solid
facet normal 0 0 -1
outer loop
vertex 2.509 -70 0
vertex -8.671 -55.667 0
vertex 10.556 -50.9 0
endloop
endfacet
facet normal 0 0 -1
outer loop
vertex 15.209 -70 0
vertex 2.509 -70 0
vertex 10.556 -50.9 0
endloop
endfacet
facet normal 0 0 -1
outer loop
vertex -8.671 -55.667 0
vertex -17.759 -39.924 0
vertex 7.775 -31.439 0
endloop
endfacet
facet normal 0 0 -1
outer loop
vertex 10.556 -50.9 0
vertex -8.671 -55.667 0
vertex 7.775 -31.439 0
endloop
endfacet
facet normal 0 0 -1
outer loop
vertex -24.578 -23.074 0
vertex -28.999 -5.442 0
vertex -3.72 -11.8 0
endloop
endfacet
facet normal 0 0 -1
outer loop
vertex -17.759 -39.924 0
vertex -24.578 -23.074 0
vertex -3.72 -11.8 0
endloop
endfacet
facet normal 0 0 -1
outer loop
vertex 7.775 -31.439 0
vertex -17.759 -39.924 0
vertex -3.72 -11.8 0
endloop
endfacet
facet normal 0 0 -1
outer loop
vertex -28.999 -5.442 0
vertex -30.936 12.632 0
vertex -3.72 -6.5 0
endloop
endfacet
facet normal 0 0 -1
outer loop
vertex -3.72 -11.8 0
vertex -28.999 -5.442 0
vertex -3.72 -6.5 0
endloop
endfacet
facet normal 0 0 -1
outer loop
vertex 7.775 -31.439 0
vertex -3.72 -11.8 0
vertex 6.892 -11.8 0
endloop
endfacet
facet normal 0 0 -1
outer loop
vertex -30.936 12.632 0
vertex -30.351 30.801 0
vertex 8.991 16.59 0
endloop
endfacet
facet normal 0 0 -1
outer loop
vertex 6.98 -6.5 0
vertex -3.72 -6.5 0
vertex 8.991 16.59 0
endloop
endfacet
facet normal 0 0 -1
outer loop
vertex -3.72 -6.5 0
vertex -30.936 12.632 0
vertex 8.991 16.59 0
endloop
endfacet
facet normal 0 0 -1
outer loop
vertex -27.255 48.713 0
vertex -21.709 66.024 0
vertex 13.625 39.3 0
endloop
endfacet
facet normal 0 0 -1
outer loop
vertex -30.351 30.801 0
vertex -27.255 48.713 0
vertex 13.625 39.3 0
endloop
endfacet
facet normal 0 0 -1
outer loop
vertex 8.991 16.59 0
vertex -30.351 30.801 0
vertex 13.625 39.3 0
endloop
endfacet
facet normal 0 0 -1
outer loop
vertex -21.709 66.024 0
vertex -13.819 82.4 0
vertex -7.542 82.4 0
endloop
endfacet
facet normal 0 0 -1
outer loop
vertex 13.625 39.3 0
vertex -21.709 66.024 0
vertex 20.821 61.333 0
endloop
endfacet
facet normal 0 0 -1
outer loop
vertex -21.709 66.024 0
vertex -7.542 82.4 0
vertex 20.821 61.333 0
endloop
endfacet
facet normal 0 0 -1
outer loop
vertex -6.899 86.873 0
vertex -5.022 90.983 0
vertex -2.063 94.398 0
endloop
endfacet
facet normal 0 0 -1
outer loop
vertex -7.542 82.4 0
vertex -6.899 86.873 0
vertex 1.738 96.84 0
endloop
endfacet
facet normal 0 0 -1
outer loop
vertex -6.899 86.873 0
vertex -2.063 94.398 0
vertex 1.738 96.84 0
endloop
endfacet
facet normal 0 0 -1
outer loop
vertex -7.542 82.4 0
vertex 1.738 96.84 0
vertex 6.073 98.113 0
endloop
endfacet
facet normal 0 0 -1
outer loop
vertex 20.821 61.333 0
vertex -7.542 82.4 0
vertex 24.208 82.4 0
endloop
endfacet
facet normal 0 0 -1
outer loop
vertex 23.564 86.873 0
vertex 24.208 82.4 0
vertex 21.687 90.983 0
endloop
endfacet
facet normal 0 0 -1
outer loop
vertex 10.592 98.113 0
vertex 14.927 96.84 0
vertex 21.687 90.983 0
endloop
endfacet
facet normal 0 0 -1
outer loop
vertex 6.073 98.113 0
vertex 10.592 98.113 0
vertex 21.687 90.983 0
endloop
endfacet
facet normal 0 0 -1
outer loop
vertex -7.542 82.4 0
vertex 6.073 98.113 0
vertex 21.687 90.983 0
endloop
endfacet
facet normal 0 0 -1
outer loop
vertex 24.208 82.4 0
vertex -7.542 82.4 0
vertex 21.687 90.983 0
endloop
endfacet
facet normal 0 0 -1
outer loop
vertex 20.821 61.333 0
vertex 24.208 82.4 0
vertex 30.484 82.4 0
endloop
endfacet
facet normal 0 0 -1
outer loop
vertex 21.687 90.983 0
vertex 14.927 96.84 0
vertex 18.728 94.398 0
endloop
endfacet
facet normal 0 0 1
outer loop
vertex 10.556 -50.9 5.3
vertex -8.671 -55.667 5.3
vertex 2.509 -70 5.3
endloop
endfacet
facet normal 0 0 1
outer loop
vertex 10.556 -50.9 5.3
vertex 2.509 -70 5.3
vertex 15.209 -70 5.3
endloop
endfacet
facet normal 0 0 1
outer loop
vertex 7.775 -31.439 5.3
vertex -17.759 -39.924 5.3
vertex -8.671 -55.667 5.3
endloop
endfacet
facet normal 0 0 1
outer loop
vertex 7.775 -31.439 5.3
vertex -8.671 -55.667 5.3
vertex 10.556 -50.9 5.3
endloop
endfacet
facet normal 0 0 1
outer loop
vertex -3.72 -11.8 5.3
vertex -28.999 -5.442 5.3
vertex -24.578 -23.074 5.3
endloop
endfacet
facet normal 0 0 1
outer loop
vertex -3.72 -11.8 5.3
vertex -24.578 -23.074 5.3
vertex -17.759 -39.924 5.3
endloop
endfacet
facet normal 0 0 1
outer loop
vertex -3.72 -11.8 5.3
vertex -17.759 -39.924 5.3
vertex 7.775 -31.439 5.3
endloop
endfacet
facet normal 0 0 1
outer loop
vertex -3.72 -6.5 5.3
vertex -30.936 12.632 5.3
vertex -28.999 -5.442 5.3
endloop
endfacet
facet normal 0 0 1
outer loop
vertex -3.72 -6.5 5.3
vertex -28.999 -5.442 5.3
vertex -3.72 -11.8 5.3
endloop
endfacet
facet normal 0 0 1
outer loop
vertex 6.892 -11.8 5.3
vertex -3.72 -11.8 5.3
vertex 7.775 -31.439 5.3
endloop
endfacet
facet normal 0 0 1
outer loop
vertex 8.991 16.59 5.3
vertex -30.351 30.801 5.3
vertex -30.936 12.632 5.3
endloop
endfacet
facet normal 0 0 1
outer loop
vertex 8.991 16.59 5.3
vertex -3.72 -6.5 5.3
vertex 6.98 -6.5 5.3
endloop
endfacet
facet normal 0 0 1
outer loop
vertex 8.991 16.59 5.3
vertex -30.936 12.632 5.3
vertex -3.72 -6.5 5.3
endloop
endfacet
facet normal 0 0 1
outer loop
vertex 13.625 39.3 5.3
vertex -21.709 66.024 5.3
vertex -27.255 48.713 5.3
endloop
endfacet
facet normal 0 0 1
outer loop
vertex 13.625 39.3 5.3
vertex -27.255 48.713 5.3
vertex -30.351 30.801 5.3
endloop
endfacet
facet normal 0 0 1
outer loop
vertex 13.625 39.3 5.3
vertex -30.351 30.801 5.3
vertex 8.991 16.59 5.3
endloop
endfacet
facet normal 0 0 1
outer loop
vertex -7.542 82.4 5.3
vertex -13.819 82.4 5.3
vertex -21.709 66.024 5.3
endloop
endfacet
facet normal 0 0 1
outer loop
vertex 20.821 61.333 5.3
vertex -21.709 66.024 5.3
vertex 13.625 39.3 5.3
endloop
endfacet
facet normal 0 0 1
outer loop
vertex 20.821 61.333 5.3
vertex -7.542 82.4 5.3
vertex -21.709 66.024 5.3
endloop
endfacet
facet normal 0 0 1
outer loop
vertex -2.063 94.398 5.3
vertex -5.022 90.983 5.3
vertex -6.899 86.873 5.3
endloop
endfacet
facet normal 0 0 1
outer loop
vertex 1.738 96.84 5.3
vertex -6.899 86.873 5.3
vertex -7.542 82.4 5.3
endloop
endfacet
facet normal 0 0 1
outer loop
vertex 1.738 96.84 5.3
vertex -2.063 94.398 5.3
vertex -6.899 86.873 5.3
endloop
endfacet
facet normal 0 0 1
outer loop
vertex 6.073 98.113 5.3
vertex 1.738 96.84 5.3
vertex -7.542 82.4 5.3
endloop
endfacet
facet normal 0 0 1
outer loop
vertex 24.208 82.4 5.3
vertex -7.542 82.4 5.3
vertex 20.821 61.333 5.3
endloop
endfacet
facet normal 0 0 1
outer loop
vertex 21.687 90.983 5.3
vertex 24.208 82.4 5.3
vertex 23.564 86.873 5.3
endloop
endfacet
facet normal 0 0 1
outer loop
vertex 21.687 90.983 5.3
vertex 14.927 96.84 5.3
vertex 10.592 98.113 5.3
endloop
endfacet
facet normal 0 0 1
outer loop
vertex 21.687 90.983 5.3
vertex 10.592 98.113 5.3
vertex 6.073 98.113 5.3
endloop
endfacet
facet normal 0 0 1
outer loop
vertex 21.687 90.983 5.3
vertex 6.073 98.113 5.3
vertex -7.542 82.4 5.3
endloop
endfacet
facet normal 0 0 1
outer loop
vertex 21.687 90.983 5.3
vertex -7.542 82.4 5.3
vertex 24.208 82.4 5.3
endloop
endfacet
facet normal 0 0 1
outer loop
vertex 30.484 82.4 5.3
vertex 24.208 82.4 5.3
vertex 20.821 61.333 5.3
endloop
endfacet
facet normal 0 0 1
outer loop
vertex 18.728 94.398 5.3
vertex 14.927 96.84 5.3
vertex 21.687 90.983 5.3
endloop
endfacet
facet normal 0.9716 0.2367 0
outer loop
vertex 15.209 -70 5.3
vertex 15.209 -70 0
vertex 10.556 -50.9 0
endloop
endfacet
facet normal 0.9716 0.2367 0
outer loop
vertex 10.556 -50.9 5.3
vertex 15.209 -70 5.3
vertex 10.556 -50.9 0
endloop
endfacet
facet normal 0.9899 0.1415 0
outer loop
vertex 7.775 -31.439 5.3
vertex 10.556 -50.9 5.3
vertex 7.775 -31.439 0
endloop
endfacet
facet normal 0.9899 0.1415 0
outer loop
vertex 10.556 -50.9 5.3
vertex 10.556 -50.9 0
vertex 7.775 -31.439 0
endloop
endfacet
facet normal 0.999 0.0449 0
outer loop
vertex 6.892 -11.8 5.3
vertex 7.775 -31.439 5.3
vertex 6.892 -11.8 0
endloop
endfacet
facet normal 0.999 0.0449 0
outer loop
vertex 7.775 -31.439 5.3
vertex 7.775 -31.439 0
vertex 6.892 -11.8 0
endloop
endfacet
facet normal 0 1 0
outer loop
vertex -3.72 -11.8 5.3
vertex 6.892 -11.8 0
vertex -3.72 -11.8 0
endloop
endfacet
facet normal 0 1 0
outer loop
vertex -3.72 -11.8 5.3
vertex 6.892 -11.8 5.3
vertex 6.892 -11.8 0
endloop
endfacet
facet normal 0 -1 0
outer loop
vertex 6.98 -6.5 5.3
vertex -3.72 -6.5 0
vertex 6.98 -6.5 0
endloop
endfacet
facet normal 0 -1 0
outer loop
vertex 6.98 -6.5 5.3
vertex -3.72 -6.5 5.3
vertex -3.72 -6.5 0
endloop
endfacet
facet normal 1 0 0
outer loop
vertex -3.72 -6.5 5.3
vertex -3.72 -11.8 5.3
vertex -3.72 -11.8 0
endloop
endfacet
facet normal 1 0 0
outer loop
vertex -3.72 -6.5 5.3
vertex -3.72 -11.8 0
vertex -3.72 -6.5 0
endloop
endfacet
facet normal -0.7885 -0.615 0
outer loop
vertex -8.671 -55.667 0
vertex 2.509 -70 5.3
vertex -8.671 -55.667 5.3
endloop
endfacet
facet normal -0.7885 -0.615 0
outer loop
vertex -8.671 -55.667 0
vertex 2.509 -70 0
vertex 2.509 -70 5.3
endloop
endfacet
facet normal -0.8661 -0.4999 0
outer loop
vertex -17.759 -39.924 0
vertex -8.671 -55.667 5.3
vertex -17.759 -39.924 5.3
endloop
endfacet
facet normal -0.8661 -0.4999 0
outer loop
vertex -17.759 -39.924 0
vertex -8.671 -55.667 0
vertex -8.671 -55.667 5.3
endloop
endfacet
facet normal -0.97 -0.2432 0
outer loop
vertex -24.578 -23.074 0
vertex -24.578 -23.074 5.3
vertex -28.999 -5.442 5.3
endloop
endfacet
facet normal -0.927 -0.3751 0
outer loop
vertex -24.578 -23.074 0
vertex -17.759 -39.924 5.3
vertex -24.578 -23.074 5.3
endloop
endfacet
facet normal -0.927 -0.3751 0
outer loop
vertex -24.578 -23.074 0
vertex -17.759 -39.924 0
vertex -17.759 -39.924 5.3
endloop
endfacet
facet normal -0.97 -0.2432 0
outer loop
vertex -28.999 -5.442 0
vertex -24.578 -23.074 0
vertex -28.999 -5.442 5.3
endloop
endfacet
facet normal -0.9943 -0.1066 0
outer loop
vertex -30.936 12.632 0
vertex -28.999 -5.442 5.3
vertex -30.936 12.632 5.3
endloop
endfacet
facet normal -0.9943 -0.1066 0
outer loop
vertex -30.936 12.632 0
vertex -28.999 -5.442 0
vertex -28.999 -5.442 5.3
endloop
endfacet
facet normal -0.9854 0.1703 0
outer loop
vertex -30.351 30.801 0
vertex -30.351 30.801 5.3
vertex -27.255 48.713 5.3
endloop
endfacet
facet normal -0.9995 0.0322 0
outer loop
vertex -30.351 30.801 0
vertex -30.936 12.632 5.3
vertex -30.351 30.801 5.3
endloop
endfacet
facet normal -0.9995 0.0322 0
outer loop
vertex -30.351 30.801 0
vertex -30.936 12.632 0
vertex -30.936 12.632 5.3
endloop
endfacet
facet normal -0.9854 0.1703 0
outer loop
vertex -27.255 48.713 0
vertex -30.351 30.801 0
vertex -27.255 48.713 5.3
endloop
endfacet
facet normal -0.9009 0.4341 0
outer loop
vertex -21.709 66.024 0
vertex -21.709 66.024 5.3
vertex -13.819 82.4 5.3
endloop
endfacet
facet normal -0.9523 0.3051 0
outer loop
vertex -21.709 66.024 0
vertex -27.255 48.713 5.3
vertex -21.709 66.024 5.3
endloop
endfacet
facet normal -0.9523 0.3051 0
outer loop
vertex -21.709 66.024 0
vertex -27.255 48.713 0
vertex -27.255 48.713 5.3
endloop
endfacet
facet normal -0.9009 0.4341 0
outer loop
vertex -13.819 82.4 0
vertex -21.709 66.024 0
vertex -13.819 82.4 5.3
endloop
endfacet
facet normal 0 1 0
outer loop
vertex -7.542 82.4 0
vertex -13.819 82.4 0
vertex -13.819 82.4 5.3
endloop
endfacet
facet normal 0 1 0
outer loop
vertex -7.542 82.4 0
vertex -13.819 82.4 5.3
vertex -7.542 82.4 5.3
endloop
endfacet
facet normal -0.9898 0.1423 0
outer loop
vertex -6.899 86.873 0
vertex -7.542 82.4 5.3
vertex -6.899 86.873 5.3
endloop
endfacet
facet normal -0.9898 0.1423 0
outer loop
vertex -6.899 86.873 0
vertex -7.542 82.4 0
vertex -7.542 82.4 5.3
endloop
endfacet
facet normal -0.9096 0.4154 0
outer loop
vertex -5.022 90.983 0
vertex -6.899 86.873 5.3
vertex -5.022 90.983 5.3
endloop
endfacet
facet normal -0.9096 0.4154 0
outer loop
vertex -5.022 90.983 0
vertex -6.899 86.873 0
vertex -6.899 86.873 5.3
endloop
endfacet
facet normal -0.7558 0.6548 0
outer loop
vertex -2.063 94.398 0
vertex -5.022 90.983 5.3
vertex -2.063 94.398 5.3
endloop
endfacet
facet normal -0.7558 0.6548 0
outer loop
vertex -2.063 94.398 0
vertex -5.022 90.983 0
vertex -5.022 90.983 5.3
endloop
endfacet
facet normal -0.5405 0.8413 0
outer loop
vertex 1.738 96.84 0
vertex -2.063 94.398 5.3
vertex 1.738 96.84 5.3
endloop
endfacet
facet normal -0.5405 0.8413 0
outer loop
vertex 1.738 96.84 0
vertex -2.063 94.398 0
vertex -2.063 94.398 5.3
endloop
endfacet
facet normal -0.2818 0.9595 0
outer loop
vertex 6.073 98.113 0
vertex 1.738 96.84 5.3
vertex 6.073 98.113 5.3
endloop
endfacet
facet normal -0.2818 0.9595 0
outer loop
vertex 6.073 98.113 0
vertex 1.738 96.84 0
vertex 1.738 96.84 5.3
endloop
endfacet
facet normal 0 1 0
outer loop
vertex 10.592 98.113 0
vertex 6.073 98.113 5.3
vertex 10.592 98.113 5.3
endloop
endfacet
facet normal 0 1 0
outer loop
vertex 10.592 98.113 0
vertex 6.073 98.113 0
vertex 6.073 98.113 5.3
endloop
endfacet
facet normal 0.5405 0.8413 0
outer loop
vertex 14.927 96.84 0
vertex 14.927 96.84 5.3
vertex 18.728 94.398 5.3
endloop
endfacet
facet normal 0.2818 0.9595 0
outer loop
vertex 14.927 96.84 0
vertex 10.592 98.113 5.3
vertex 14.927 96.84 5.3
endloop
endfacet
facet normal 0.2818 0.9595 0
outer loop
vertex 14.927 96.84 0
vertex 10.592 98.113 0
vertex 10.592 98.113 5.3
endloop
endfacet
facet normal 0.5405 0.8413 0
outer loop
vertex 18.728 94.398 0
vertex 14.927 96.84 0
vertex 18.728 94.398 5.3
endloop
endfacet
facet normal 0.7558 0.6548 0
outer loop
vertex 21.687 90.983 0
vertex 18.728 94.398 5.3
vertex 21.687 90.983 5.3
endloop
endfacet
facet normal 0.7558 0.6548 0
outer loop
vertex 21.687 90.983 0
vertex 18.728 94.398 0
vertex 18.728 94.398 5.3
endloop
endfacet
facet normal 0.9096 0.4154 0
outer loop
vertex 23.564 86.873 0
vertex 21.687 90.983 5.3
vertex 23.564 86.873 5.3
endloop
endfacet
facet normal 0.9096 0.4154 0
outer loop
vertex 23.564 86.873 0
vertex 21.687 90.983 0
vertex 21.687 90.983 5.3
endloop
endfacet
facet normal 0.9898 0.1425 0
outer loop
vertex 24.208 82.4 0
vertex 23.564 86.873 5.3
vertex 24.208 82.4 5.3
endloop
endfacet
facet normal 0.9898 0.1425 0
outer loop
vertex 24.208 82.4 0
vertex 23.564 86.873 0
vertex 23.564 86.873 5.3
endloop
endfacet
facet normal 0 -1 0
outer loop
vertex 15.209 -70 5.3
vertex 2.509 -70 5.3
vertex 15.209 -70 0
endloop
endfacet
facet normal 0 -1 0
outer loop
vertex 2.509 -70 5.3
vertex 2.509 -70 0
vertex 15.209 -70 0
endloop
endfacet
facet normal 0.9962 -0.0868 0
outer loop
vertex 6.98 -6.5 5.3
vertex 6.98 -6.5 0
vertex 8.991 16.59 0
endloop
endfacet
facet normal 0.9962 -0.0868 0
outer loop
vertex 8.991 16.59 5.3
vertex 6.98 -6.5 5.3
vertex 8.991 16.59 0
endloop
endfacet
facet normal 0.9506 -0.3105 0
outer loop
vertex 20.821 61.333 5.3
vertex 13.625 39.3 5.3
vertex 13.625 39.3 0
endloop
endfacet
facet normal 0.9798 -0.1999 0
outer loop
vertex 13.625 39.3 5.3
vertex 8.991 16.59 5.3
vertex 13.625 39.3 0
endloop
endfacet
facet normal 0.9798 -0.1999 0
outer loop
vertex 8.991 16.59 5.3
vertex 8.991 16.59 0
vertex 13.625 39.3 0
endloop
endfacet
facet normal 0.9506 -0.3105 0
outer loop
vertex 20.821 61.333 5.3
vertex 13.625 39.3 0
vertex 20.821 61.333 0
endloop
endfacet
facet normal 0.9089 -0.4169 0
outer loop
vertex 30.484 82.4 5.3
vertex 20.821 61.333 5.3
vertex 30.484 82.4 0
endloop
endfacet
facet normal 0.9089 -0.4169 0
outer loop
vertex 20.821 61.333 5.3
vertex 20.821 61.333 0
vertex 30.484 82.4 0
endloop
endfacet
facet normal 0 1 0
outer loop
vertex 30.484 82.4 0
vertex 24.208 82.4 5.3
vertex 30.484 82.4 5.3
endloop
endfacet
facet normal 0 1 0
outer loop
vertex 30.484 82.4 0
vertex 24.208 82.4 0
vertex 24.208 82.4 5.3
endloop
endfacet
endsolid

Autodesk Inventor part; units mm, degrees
ref_plane "YZ Plane" through (0, 0, 0) normal (1, 0, 0) x (0, 1, 0)
ref_plane "XZ Plane" through (0, 0, 0) normal (0, 1, 0) x (-1, 0, 0)
ref_plane "XY Plane" through (0, 0, 0) normal (0, 0, 1) x (1, 0, 0)
sketch "Sketch1" plane through (0, 0, 0) normal (0, 0, 1) x (1, 0, 0)
  line L0 (-13.819, 82.4) -> (-7.5425, 82.4)
  line L1 (24.2075, 82.4) -> (30.484, 82.4)
  arc A0 (24.2075, 82.4) -> (-7.5425, 82.4) centre (8.3325, 82.4) ccw
  arc A1 (30.484, 82.4) -> (15.2091, -70) centre (209.6265, -12.5208) ccw
  line L2 (2.5091, -70) -> (15.2091, -70)
  arc A2 (-13.819, 82.4) -> (2.5091, -70) centre (99.9218, 17.5115) ccw
  point P0 (0, 0)
  dimension "d0" = 31.75
  dimension "d1" = 12.7
  dimension "d2" = 152.4
  dimension "d9" = 70
extrude "Extrusion1" add sketch "Sketch1" along normal blind 5.3
sketch "Sketch2" plane through (0, 0, 5.3) normal (0, 0, 1) x (1, 0, 0)
  line L0 (-3.7203, -6.5) -> (27.9202, -6.5)
  line L1 (27.9202, -6.5) -> (27.9202, -11.8)
  line L2 (27.9202, -11.8) -> (-3.7203, -11.8)
  line L3 (-3.7203, -11.8) -> (-3.7203, -6.5)
  line L4 (-7.5425, 82.4) -> (-13.819, 82.4) projected
  line L5 (-7.5425, 82.4) -> (-13.819, 82.4) projected
  arc A0 (-13.819, 82.4) -> (2.5091, -70) centre (99.9218, 17.5115) ccw projected
  line L6 (2.5091, -70) -> (15.2091, -70) projected
  arc A1 (30.484, 82.4) -> (15.2091, -70) centre (209.6265, -12.5208) ccw projected
  line L7 (30.484, 82.4) -> (24.2075, 82.4) projected
  arc A2 (24.2075, 82.4) -> (-7.5425, 82.4) centre (8.3325, 82.4) ccw projected
  point P0 (0, 0)
  point P1 (6.9797, -6.5)
  dimension "d5" = 5.3
  dimension "d6" = 88.9
  dimension "d10" = 10.7
extrude "Extrusion2" cut sketch "Sketch2" against normal up to surface (5.3 mm away) contours L0 A1 L2 L3 | L0 L1 L2 A1
properties part number "leg"
